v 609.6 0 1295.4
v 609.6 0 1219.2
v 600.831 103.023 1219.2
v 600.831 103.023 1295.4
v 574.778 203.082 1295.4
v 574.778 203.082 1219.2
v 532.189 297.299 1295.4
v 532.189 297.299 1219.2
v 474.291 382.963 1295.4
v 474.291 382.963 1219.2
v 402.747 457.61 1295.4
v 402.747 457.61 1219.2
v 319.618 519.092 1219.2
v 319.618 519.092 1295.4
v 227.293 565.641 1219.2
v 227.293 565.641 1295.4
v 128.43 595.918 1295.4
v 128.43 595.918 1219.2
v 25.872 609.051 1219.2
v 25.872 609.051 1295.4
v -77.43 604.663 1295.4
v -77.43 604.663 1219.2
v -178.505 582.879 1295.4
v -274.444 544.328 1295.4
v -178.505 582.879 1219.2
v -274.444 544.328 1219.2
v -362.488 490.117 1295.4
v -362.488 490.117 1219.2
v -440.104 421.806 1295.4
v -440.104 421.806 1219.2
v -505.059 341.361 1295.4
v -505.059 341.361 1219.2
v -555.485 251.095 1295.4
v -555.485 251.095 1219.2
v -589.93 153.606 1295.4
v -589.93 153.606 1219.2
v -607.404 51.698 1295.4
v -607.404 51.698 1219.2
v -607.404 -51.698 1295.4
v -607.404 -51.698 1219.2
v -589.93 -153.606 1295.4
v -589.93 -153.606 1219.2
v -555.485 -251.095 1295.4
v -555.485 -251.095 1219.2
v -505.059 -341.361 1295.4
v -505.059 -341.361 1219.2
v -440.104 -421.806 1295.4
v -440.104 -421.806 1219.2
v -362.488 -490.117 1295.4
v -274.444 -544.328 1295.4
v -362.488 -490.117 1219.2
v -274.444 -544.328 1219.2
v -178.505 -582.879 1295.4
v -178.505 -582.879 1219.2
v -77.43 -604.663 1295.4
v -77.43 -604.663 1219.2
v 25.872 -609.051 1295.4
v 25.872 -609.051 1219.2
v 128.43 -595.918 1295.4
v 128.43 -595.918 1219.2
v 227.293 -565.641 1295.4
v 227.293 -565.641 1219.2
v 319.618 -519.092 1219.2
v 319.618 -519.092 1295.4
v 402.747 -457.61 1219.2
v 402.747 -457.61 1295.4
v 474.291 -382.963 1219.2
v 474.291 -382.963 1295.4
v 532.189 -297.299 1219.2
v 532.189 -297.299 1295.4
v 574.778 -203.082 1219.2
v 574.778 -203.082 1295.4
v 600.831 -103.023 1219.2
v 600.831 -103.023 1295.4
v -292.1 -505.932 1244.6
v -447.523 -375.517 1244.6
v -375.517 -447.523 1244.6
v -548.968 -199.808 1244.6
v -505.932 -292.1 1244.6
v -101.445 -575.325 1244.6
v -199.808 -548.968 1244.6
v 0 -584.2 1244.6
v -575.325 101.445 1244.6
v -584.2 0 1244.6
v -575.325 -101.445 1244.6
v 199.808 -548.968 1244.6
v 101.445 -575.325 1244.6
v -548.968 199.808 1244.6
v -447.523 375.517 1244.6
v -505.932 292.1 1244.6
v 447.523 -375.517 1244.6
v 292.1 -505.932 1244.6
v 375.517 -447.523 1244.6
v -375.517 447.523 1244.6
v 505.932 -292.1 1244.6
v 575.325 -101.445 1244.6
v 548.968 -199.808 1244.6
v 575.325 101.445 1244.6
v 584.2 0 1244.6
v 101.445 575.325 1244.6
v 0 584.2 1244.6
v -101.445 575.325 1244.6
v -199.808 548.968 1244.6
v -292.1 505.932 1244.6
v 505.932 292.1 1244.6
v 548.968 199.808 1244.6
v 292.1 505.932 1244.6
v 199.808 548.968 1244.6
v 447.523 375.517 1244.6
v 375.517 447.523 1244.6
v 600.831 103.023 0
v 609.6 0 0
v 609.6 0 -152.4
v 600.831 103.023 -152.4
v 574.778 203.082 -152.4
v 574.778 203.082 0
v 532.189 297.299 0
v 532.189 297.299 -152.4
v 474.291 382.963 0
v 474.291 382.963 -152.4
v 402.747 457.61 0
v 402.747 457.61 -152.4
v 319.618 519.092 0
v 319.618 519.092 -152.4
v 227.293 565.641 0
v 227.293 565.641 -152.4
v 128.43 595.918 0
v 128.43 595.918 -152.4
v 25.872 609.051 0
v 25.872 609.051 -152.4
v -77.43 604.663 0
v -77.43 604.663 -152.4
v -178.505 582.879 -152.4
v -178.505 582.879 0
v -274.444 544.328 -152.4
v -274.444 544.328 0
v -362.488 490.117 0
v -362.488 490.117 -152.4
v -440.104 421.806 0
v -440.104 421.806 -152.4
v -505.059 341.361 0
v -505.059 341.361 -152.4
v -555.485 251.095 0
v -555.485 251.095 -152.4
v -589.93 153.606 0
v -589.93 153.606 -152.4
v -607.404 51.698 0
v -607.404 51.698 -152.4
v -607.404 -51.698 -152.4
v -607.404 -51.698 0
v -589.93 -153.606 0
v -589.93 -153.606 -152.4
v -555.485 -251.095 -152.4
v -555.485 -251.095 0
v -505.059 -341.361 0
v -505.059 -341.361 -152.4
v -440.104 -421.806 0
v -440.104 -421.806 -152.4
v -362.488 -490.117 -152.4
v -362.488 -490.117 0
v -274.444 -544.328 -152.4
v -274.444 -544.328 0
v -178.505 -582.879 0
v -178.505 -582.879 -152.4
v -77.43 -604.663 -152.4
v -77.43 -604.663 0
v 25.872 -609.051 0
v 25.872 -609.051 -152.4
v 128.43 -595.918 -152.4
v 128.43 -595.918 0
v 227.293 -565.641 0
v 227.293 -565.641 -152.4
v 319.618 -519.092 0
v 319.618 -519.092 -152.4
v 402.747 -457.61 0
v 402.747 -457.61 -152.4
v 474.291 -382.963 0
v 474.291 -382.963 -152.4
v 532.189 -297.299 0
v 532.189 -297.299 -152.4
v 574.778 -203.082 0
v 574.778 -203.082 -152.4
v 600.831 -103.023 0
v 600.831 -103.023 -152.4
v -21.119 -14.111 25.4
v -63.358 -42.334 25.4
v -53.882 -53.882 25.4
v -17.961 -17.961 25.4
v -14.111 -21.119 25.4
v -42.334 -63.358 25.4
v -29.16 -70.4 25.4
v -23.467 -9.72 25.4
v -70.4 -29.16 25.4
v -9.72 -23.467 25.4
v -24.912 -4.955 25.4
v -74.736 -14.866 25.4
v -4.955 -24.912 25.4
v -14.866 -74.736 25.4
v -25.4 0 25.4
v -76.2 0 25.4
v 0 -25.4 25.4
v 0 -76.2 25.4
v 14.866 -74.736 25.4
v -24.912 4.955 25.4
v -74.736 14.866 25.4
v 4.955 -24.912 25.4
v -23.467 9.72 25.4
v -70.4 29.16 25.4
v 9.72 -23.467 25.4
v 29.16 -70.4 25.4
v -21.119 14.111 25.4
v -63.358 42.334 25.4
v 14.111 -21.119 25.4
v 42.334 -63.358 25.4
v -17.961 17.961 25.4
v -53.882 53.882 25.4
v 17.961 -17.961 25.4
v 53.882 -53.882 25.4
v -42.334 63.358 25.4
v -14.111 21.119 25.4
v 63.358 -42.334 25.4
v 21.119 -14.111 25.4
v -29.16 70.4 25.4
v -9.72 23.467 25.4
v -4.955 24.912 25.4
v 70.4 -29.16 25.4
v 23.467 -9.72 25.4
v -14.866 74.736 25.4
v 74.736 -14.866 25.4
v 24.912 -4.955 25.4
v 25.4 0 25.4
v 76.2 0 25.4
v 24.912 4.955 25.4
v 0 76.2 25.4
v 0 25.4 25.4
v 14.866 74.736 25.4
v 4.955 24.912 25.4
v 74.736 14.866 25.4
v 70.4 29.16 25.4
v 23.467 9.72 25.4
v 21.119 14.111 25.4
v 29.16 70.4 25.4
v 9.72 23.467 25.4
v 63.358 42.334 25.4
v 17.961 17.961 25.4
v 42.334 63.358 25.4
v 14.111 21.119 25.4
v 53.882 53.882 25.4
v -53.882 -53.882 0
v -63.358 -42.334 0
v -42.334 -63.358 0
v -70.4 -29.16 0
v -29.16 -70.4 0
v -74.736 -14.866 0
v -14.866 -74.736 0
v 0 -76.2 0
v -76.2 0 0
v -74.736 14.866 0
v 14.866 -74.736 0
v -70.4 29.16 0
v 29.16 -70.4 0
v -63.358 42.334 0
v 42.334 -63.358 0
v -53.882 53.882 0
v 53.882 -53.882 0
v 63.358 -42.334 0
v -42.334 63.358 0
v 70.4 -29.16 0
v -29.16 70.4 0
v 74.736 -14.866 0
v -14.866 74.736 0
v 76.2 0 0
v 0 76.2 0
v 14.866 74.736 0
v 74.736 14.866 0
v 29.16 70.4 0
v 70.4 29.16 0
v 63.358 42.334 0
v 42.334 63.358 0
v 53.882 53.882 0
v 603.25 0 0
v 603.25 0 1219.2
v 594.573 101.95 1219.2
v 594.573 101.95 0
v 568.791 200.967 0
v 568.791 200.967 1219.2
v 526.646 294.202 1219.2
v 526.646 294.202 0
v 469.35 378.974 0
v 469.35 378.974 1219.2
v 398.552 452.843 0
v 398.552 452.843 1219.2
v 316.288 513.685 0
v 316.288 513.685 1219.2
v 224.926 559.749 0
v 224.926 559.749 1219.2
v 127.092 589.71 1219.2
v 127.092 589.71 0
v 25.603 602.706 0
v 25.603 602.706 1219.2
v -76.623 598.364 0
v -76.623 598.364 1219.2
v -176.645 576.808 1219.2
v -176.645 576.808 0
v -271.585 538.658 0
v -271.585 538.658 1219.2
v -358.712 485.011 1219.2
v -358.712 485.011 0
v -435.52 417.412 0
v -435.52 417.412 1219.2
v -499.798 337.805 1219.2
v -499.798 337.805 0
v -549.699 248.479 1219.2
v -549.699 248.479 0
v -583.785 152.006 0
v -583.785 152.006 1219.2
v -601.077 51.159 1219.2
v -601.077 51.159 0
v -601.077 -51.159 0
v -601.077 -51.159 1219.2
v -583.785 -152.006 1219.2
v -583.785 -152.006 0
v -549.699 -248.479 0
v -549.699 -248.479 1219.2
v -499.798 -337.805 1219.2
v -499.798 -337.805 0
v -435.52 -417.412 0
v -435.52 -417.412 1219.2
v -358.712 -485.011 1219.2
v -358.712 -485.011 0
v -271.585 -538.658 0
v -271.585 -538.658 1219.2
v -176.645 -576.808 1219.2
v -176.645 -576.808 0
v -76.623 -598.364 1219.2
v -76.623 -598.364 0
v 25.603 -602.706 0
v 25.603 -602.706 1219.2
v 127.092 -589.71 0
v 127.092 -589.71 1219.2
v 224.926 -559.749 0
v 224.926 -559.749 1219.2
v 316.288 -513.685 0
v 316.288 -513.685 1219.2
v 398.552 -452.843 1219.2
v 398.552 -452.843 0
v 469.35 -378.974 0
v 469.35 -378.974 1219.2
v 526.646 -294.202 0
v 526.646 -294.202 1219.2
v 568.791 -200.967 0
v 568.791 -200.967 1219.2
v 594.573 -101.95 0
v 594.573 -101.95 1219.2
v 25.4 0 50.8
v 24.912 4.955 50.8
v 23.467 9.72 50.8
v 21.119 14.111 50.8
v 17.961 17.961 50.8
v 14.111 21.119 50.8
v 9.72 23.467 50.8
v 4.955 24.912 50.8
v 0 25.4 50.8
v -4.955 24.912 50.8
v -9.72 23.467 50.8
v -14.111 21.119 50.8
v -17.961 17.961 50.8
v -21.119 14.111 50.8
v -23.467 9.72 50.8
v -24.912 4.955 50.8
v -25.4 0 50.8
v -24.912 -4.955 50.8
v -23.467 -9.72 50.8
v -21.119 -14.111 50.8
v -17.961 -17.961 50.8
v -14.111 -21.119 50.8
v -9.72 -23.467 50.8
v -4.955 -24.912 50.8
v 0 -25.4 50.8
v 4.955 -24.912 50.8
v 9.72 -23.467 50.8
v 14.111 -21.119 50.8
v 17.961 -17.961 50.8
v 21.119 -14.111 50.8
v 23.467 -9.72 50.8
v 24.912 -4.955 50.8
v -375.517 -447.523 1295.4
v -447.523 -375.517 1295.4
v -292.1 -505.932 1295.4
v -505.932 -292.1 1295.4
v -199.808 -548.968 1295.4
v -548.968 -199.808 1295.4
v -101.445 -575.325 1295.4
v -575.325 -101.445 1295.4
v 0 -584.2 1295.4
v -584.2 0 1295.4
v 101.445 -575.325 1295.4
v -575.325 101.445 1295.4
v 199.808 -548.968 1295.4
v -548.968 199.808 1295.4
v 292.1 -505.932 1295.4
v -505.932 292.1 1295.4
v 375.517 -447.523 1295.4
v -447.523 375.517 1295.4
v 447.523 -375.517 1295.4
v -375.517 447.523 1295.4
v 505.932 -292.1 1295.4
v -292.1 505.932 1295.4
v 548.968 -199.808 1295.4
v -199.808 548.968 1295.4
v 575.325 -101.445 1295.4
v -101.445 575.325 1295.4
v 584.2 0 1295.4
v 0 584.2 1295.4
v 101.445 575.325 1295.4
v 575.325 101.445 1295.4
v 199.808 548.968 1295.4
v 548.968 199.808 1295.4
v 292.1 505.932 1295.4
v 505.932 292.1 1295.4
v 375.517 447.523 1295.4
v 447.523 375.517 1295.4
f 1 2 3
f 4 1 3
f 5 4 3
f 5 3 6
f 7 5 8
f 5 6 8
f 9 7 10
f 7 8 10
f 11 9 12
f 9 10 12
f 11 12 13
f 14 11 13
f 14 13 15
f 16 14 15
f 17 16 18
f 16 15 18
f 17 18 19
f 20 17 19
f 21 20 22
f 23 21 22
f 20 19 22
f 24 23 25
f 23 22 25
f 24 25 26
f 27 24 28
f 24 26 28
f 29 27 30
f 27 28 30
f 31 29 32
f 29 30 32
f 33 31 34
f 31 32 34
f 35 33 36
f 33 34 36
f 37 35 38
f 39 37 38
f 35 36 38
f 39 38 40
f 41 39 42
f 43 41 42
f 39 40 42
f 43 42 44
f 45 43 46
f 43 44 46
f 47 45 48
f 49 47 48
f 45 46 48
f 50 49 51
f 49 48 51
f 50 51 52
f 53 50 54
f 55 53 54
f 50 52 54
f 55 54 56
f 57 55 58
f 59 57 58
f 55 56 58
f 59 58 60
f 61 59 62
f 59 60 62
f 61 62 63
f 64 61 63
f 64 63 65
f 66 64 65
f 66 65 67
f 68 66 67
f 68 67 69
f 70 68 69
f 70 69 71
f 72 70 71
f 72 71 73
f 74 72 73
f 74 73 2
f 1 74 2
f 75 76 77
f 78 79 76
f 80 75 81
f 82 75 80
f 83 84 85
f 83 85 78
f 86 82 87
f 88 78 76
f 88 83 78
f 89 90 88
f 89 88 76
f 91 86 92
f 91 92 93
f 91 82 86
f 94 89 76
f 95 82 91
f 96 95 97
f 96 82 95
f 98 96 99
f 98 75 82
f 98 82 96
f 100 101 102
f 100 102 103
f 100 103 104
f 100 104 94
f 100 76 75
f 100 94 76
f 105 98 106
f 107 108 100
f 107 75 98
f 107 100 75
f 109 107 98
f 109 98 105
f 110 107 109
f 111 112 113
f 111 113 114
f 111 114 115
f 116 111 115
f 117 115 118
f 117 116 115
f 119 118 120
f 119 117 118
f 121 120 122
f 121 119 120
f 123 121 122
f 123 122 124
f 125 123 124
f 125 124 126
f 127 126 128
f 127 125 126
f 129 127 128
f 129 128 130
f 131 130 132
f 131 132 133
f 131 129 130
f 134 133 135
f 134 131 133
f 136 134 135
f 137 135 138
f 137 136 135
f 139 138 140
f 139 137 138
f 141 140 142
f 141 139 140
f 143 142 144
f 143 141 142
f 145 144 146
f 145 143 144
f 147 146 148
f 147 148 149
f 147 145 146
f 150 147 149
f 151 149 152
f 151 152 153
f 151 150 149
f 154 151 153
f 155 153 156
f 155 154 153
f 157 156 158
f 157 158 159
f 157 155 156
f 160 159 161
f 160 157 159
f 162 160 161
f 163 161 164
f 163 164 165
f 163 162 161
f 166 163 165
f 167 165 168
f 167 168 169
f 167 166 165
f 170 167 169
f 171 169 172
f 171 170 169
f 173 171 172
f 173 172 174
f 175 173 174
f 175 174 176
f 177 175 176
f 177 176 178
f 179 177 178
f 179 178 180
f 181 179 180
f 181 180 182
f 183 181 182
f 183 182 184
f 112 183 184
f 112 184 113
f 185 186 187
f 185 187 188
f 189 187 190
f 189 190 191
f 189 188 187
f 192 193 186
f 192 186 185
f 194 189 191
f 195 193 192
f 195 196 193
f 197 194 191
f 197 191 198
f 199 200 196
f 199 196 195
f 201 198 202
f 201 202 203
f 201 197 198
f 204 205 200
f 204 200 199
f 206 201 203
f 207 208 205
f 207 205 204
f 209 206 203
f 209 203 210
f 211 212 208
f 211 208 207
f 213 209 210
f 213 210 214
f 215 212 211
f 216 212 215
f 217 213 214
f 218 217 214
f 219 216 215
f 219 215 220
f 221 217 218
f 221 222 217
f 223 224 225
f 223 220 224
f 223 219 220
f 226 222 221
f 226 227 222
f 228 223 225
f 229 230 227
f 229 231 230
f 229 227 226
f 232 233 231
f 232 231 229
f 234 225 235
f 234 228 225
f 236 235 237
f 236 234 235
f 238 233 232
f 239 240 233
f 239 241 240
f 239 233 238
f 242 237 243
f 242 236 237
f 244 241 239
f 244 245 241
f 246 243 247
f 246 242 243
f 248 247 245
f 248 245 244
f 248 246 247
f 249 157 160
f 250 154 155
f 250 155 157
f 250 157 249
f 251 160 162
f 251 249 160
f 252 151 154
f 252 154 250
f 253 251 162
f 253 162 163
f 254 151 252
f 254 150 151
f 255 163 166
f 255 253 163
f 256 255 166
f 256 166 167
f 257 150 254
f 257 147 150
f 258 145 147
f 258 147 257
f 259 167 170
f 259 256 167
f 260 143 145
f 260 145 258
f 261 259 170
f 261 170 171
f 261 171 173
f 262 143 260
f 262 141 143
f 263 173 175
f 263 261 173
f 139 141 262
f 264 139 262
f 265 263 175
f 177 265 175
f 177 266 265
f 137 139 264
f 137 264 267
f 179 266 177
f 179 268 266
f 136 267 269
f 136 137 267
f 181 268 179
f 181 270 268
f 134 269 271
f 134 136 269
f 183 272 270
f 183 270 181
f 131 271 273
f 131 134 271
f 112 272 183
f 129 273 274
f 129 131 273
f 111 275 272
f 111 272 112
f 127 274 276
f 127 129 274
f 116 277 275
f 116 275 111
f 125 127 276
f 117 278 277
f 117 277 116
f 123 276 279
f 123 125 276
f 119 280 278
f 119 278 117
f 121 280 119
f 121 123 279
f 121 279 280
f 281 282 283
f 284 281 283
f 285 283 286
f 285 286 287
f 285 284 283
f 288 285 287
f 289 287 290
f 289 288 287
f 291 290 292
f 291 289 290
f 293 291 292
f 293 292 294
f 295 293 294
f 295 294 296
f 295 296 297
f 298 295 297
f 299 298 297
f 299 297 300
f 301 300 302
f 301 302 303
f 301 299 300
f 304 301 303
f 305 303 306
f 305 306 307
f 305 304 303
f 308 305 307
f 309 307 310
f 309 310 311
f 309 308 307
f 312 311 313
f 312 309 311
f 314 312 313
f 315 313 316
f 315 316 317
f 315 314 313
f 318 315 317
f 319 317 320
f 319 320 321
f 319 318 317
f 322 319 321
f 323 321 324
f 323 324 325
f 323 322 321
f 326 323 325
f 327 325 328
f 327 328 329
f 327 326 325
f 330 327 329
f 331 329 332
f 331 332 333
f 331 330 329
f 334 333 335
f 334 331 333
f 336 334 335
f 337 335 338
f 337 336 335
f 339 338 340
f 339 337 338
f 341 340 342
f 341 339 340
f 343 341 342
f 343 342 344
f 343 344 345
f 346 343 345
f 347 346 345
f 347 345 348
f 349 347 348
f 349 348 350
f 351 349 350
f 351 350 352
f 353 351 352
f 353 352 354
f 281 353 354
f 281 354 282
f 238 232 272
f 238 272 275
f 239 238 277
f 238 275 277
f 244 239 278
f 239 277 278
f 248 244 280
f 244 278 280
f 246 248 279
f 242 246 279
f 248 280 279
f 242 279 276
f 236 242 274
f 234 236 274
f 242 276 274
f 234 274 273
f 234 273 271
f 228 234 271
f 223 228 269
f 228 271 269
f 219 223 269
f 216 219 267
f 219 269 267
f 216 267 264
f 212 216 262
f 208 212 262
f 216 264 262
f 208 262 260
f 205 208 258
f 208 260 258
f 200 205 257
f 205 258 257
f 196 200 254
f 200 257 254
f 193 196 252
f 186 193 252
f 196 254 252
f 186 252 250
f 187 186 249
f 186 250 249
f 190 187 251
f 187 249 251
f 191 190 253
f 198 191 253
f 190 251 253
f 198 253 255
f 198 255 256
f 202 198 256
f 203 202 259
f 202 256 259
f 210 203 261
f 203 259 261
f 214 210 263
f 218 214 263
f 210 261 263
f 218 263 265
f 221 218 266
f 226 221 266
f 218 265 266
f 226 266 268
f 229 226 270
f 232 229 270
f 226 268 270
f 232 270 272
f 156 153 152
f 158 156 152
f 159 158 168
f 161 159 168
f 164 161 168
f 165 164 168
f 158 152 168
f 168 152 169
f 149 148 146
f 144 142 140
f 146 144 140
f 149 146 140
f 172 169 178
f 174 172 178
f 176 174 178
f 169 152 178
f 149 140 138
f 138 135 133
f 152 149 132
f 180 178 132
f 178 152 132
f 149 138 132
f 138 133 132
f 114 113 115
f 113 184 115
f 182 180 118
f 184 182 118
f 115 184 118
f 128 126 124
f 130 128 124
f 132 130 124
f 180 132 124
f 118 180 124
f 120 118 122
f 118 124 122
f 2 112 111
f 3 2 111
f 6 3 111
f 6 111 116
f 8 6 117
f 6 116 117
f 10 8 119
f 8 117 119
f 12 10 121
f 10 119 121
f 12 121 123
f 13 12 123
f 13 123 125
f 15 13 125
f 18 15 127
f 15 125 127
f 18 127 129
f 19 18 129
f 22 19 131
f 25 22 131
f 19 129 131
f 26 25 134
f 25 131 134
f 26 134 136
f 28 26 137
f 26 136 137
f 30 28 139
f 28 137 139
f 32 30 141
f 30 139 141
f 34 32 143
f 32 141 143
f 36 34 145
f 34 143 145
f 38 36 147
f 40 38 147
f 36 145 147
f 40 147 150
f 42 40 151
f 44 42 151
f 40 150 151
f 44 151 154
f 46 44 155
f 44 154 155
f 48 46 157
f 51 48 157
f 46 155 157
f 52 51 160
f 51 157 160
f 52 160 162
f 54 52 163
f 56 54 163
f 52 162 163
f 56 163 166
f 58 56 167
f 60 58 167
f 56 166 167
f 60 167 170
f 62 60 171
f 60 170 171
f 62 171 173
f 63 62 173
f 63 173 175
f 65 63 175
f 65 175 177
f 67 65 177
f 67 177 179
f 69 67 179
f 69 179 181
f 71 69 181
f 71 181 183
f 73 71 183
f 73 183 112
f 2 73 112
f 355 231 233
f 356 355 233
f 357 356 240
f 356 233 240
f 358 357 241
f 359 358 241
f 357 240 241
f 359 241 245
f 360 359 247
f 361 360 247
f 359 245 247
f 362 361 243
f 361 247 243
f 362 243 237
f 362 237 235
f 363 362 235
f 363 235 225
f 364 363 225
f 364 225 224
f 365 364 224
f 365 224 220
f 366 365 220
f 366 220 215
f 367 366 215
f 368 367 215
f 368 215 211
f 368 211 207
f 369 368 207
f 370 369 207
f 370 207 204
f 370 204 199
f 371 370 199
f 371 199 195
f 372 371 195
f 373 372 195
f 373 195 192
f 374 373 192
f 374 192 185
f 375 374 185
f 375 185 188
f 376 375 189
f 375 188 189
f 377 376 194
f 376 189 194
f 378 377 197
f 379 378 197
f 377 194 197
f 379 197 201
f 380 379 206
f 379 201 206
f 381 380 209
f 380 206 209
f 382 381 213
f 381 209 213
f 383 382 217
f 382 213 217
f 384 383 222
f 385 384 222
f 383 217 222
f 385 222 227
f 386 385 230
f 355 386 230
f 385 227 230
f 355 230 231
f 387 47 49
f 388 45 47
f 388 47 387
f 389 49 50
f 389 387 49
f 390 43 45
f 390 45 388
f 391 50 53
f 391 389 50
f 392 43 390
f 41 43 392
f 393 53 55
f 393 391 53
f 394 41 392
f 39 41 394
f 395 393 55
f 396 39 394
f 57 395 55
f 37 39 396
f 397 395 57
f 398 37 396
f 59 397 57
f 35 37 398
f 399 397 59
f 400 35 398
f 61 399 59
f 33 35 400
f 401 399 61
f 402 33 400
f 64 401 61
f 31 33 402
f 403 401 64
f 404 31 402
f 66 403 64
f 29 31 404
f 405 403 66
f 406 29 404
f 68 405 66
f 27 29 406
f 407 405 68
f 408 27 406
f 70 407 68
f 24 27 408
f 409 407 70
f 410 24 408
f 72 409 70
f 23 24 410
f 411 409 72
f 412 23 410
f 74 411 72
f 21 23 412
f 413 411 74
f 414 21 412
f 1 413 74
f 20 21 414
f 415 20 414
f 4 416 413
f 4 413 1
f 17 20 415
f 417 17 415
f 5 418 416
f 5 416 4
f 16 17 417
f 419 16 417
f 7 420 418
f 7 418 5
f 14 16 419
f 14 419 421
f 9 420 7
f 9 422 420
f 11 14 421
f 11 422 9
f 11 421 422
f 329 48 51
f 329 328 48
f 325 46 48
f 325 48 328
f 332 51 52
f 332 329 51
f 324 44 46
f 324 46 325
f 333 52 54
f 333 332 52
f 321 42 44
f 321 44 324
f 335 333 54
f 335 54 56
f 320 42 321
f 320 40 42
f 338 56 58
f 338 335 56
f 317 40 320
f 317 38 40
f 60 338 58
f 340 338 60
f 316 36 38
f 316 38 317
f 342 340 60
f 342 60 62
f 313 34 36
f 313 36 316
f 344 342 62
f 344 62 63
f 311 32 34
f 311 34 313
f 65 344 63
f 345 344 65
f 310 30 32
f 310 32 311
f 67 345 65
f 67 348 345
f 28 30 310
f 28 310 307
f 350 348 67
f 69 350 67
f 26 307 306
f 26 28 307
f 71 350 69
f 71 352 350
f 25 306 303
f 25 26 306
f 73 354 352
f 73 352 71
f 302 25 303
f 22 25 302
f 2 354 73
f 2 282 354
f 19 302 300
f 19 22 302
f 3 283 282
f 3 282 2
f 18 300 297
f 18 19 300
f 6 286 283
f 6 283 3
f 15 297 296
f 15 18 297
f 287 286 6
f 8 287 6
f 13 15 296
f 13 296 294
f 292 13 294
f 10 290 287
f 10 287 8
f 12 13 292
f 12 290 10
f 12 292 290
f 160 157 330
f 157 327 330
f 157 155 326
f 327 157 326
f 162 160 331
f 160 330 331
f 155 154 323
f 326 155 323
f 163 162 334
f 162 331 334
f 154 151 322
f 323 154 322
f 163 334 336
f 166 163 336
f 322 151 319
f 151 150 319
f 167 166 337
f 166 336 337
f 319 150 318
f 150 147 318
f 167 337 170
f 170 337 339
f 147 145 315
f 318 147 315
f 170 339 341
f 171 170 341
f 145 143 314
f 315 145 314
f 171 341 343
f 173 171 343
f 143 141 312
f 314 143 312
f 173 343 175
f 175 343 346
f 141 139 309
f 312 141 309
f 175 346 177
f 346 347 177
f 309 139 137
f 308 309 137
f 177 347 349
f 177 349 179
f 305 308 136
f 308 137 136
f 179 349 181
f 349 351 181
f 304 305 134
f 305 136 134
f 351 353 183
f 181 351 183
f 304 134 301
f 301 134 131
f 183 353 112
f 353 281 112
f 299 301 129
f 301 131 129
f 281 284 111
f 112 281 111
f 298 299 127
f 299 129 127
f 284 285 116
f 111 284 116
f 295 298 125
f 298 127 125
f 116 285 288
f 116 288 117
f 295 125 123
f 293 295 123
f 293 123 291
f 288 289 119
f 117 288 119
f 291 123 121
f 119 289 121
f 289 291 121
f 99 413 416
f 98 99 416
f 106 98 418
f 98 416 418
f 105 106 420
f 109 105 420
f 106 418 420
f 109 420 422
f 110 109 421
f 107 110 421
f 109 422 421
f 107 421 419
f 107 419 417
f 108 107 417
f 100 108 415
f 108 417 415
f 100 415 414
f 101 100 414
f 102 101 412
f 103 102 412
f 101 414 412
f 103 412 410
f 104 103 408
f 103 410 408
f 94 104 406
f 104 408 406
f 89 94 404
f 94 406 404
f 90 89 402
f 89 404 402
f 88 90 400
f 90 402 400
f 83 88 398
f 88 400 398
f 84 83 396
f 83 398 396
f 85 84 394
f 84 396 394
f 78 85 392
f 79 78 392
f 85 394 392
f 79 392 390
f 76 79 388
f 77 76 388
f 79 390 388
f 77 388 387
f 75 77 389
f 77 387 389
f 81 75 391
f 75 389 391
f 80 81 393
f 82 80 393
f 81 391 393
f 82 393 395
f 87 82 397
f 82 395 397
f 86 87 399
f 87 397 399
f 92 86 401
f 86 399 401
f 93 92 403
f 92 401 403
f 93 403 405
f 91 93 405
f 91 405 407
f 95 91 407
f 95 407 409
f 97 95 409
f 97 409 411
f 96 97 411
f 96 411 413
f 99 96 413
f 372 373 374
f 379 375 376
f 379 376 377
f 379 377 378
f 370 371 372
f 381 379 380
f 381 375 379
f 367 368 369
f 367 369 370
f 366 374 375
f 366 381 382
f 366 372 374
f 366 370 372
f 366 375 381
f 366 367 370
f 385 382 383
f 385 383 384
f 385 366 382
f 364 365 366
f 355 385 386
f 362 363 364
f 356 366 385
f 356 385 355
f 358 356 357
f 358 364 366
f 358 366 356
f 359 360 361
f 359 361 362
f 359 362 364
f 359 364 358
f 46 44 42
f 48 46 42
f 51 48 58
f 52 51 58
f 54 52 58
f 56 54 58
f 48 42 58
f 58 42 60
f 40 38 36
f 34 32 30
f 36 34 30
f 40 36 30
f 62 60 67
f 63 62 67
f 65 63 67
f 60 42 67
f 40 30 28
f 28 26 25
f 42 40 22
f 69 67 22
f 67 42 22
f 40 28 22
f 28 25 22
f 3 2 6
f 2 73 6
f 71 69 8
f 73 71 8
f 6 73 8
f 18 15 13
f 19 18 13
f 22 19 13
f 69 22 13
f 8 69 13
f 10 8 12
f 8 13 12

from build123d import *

# Parameters (mm, degrees)
SKETCH1_R           = 609.6
BOSS_EXTRUDE1_DEPTH = 152.4
SKETCH5_R           = 25.4
SKETCH5_R_2         = 76.2
BOSS_EXTRUDE5_DEPTH = 25.4
SKETCH5_3_R         = 25.4
BOSS_EXTRUDE6_DEPTH = 50.8
SKETCH2_R           = 609.6
SKETCH2_R_2         = 603.25
BOSS_EXTRUDE2_DEPTH = 1219.2
SKETCH3_R           = 609.6
BOSS_EXTRUDE3_DEPTH = 76.2
SKETCH4_R           = 584.2
CUT_EXTRUDE1_DEPTH  = 50.8


with BuildPart() as part:
    # Sketch1 → Boss-Extrude1 (new body)
    with BuildSketch(Plane.XY):
        Circle(SKETCH1_R)
    extrude(amount=-BOSS_EXTRUDE1_DEPTH)

    # Sketch5 → Boss-Extrude5 (add)
    with BuildSketch(Plane.XY):
        Circle(SKETCH5_R)
        Circle(SKETCH5_R_2)
        Circle(SKETCH5_R, mode=Mode.SUBTRACT)
    extrude(amount=BOSS_EXTRUDE5_DEPTH)

    # Sketch5<3> → Boss-Extrude6 (add)
    with BuildSketch(Plane.XY):
        Circle(SKETCH5_3_R)
    extrude(amount=BOSS_EXTRUDE6_DEPTH)


with BuildPart() as body_2:
    # Sketch2 → Boss-Extrude2 (new body)
    with BuildSketch(Plane.XY):
        Circle(SKETCH2_R)
        Circle(SKETCH2_R_2, mode=Mode.SUBTRACT)
    extrude(amount=BOSS_EXTRUDE2_DEPTH)


with BuildPart() as body_3:
    # Sketch3 → Boss-Extrude3 (new body)
    with BuildSketch(Plane.XY.offset(1219.2)):
        Circle(SKETCH3_R)
    extrude(amount=BOSS_EXTRUDE3_DEPTH)

    # Sketch4 → Cut-Extrude1 (cut)
    with BuildSketch(Plane.XY.offset(1295.4)):
        Circle(SKETCH4_R)
    extrude(amount=-CUT_EXTRUDE1_DEPTH, mode=Mode.SUBTRACT)


solid = Compound([part.part, body_2.part, body_3.part])
